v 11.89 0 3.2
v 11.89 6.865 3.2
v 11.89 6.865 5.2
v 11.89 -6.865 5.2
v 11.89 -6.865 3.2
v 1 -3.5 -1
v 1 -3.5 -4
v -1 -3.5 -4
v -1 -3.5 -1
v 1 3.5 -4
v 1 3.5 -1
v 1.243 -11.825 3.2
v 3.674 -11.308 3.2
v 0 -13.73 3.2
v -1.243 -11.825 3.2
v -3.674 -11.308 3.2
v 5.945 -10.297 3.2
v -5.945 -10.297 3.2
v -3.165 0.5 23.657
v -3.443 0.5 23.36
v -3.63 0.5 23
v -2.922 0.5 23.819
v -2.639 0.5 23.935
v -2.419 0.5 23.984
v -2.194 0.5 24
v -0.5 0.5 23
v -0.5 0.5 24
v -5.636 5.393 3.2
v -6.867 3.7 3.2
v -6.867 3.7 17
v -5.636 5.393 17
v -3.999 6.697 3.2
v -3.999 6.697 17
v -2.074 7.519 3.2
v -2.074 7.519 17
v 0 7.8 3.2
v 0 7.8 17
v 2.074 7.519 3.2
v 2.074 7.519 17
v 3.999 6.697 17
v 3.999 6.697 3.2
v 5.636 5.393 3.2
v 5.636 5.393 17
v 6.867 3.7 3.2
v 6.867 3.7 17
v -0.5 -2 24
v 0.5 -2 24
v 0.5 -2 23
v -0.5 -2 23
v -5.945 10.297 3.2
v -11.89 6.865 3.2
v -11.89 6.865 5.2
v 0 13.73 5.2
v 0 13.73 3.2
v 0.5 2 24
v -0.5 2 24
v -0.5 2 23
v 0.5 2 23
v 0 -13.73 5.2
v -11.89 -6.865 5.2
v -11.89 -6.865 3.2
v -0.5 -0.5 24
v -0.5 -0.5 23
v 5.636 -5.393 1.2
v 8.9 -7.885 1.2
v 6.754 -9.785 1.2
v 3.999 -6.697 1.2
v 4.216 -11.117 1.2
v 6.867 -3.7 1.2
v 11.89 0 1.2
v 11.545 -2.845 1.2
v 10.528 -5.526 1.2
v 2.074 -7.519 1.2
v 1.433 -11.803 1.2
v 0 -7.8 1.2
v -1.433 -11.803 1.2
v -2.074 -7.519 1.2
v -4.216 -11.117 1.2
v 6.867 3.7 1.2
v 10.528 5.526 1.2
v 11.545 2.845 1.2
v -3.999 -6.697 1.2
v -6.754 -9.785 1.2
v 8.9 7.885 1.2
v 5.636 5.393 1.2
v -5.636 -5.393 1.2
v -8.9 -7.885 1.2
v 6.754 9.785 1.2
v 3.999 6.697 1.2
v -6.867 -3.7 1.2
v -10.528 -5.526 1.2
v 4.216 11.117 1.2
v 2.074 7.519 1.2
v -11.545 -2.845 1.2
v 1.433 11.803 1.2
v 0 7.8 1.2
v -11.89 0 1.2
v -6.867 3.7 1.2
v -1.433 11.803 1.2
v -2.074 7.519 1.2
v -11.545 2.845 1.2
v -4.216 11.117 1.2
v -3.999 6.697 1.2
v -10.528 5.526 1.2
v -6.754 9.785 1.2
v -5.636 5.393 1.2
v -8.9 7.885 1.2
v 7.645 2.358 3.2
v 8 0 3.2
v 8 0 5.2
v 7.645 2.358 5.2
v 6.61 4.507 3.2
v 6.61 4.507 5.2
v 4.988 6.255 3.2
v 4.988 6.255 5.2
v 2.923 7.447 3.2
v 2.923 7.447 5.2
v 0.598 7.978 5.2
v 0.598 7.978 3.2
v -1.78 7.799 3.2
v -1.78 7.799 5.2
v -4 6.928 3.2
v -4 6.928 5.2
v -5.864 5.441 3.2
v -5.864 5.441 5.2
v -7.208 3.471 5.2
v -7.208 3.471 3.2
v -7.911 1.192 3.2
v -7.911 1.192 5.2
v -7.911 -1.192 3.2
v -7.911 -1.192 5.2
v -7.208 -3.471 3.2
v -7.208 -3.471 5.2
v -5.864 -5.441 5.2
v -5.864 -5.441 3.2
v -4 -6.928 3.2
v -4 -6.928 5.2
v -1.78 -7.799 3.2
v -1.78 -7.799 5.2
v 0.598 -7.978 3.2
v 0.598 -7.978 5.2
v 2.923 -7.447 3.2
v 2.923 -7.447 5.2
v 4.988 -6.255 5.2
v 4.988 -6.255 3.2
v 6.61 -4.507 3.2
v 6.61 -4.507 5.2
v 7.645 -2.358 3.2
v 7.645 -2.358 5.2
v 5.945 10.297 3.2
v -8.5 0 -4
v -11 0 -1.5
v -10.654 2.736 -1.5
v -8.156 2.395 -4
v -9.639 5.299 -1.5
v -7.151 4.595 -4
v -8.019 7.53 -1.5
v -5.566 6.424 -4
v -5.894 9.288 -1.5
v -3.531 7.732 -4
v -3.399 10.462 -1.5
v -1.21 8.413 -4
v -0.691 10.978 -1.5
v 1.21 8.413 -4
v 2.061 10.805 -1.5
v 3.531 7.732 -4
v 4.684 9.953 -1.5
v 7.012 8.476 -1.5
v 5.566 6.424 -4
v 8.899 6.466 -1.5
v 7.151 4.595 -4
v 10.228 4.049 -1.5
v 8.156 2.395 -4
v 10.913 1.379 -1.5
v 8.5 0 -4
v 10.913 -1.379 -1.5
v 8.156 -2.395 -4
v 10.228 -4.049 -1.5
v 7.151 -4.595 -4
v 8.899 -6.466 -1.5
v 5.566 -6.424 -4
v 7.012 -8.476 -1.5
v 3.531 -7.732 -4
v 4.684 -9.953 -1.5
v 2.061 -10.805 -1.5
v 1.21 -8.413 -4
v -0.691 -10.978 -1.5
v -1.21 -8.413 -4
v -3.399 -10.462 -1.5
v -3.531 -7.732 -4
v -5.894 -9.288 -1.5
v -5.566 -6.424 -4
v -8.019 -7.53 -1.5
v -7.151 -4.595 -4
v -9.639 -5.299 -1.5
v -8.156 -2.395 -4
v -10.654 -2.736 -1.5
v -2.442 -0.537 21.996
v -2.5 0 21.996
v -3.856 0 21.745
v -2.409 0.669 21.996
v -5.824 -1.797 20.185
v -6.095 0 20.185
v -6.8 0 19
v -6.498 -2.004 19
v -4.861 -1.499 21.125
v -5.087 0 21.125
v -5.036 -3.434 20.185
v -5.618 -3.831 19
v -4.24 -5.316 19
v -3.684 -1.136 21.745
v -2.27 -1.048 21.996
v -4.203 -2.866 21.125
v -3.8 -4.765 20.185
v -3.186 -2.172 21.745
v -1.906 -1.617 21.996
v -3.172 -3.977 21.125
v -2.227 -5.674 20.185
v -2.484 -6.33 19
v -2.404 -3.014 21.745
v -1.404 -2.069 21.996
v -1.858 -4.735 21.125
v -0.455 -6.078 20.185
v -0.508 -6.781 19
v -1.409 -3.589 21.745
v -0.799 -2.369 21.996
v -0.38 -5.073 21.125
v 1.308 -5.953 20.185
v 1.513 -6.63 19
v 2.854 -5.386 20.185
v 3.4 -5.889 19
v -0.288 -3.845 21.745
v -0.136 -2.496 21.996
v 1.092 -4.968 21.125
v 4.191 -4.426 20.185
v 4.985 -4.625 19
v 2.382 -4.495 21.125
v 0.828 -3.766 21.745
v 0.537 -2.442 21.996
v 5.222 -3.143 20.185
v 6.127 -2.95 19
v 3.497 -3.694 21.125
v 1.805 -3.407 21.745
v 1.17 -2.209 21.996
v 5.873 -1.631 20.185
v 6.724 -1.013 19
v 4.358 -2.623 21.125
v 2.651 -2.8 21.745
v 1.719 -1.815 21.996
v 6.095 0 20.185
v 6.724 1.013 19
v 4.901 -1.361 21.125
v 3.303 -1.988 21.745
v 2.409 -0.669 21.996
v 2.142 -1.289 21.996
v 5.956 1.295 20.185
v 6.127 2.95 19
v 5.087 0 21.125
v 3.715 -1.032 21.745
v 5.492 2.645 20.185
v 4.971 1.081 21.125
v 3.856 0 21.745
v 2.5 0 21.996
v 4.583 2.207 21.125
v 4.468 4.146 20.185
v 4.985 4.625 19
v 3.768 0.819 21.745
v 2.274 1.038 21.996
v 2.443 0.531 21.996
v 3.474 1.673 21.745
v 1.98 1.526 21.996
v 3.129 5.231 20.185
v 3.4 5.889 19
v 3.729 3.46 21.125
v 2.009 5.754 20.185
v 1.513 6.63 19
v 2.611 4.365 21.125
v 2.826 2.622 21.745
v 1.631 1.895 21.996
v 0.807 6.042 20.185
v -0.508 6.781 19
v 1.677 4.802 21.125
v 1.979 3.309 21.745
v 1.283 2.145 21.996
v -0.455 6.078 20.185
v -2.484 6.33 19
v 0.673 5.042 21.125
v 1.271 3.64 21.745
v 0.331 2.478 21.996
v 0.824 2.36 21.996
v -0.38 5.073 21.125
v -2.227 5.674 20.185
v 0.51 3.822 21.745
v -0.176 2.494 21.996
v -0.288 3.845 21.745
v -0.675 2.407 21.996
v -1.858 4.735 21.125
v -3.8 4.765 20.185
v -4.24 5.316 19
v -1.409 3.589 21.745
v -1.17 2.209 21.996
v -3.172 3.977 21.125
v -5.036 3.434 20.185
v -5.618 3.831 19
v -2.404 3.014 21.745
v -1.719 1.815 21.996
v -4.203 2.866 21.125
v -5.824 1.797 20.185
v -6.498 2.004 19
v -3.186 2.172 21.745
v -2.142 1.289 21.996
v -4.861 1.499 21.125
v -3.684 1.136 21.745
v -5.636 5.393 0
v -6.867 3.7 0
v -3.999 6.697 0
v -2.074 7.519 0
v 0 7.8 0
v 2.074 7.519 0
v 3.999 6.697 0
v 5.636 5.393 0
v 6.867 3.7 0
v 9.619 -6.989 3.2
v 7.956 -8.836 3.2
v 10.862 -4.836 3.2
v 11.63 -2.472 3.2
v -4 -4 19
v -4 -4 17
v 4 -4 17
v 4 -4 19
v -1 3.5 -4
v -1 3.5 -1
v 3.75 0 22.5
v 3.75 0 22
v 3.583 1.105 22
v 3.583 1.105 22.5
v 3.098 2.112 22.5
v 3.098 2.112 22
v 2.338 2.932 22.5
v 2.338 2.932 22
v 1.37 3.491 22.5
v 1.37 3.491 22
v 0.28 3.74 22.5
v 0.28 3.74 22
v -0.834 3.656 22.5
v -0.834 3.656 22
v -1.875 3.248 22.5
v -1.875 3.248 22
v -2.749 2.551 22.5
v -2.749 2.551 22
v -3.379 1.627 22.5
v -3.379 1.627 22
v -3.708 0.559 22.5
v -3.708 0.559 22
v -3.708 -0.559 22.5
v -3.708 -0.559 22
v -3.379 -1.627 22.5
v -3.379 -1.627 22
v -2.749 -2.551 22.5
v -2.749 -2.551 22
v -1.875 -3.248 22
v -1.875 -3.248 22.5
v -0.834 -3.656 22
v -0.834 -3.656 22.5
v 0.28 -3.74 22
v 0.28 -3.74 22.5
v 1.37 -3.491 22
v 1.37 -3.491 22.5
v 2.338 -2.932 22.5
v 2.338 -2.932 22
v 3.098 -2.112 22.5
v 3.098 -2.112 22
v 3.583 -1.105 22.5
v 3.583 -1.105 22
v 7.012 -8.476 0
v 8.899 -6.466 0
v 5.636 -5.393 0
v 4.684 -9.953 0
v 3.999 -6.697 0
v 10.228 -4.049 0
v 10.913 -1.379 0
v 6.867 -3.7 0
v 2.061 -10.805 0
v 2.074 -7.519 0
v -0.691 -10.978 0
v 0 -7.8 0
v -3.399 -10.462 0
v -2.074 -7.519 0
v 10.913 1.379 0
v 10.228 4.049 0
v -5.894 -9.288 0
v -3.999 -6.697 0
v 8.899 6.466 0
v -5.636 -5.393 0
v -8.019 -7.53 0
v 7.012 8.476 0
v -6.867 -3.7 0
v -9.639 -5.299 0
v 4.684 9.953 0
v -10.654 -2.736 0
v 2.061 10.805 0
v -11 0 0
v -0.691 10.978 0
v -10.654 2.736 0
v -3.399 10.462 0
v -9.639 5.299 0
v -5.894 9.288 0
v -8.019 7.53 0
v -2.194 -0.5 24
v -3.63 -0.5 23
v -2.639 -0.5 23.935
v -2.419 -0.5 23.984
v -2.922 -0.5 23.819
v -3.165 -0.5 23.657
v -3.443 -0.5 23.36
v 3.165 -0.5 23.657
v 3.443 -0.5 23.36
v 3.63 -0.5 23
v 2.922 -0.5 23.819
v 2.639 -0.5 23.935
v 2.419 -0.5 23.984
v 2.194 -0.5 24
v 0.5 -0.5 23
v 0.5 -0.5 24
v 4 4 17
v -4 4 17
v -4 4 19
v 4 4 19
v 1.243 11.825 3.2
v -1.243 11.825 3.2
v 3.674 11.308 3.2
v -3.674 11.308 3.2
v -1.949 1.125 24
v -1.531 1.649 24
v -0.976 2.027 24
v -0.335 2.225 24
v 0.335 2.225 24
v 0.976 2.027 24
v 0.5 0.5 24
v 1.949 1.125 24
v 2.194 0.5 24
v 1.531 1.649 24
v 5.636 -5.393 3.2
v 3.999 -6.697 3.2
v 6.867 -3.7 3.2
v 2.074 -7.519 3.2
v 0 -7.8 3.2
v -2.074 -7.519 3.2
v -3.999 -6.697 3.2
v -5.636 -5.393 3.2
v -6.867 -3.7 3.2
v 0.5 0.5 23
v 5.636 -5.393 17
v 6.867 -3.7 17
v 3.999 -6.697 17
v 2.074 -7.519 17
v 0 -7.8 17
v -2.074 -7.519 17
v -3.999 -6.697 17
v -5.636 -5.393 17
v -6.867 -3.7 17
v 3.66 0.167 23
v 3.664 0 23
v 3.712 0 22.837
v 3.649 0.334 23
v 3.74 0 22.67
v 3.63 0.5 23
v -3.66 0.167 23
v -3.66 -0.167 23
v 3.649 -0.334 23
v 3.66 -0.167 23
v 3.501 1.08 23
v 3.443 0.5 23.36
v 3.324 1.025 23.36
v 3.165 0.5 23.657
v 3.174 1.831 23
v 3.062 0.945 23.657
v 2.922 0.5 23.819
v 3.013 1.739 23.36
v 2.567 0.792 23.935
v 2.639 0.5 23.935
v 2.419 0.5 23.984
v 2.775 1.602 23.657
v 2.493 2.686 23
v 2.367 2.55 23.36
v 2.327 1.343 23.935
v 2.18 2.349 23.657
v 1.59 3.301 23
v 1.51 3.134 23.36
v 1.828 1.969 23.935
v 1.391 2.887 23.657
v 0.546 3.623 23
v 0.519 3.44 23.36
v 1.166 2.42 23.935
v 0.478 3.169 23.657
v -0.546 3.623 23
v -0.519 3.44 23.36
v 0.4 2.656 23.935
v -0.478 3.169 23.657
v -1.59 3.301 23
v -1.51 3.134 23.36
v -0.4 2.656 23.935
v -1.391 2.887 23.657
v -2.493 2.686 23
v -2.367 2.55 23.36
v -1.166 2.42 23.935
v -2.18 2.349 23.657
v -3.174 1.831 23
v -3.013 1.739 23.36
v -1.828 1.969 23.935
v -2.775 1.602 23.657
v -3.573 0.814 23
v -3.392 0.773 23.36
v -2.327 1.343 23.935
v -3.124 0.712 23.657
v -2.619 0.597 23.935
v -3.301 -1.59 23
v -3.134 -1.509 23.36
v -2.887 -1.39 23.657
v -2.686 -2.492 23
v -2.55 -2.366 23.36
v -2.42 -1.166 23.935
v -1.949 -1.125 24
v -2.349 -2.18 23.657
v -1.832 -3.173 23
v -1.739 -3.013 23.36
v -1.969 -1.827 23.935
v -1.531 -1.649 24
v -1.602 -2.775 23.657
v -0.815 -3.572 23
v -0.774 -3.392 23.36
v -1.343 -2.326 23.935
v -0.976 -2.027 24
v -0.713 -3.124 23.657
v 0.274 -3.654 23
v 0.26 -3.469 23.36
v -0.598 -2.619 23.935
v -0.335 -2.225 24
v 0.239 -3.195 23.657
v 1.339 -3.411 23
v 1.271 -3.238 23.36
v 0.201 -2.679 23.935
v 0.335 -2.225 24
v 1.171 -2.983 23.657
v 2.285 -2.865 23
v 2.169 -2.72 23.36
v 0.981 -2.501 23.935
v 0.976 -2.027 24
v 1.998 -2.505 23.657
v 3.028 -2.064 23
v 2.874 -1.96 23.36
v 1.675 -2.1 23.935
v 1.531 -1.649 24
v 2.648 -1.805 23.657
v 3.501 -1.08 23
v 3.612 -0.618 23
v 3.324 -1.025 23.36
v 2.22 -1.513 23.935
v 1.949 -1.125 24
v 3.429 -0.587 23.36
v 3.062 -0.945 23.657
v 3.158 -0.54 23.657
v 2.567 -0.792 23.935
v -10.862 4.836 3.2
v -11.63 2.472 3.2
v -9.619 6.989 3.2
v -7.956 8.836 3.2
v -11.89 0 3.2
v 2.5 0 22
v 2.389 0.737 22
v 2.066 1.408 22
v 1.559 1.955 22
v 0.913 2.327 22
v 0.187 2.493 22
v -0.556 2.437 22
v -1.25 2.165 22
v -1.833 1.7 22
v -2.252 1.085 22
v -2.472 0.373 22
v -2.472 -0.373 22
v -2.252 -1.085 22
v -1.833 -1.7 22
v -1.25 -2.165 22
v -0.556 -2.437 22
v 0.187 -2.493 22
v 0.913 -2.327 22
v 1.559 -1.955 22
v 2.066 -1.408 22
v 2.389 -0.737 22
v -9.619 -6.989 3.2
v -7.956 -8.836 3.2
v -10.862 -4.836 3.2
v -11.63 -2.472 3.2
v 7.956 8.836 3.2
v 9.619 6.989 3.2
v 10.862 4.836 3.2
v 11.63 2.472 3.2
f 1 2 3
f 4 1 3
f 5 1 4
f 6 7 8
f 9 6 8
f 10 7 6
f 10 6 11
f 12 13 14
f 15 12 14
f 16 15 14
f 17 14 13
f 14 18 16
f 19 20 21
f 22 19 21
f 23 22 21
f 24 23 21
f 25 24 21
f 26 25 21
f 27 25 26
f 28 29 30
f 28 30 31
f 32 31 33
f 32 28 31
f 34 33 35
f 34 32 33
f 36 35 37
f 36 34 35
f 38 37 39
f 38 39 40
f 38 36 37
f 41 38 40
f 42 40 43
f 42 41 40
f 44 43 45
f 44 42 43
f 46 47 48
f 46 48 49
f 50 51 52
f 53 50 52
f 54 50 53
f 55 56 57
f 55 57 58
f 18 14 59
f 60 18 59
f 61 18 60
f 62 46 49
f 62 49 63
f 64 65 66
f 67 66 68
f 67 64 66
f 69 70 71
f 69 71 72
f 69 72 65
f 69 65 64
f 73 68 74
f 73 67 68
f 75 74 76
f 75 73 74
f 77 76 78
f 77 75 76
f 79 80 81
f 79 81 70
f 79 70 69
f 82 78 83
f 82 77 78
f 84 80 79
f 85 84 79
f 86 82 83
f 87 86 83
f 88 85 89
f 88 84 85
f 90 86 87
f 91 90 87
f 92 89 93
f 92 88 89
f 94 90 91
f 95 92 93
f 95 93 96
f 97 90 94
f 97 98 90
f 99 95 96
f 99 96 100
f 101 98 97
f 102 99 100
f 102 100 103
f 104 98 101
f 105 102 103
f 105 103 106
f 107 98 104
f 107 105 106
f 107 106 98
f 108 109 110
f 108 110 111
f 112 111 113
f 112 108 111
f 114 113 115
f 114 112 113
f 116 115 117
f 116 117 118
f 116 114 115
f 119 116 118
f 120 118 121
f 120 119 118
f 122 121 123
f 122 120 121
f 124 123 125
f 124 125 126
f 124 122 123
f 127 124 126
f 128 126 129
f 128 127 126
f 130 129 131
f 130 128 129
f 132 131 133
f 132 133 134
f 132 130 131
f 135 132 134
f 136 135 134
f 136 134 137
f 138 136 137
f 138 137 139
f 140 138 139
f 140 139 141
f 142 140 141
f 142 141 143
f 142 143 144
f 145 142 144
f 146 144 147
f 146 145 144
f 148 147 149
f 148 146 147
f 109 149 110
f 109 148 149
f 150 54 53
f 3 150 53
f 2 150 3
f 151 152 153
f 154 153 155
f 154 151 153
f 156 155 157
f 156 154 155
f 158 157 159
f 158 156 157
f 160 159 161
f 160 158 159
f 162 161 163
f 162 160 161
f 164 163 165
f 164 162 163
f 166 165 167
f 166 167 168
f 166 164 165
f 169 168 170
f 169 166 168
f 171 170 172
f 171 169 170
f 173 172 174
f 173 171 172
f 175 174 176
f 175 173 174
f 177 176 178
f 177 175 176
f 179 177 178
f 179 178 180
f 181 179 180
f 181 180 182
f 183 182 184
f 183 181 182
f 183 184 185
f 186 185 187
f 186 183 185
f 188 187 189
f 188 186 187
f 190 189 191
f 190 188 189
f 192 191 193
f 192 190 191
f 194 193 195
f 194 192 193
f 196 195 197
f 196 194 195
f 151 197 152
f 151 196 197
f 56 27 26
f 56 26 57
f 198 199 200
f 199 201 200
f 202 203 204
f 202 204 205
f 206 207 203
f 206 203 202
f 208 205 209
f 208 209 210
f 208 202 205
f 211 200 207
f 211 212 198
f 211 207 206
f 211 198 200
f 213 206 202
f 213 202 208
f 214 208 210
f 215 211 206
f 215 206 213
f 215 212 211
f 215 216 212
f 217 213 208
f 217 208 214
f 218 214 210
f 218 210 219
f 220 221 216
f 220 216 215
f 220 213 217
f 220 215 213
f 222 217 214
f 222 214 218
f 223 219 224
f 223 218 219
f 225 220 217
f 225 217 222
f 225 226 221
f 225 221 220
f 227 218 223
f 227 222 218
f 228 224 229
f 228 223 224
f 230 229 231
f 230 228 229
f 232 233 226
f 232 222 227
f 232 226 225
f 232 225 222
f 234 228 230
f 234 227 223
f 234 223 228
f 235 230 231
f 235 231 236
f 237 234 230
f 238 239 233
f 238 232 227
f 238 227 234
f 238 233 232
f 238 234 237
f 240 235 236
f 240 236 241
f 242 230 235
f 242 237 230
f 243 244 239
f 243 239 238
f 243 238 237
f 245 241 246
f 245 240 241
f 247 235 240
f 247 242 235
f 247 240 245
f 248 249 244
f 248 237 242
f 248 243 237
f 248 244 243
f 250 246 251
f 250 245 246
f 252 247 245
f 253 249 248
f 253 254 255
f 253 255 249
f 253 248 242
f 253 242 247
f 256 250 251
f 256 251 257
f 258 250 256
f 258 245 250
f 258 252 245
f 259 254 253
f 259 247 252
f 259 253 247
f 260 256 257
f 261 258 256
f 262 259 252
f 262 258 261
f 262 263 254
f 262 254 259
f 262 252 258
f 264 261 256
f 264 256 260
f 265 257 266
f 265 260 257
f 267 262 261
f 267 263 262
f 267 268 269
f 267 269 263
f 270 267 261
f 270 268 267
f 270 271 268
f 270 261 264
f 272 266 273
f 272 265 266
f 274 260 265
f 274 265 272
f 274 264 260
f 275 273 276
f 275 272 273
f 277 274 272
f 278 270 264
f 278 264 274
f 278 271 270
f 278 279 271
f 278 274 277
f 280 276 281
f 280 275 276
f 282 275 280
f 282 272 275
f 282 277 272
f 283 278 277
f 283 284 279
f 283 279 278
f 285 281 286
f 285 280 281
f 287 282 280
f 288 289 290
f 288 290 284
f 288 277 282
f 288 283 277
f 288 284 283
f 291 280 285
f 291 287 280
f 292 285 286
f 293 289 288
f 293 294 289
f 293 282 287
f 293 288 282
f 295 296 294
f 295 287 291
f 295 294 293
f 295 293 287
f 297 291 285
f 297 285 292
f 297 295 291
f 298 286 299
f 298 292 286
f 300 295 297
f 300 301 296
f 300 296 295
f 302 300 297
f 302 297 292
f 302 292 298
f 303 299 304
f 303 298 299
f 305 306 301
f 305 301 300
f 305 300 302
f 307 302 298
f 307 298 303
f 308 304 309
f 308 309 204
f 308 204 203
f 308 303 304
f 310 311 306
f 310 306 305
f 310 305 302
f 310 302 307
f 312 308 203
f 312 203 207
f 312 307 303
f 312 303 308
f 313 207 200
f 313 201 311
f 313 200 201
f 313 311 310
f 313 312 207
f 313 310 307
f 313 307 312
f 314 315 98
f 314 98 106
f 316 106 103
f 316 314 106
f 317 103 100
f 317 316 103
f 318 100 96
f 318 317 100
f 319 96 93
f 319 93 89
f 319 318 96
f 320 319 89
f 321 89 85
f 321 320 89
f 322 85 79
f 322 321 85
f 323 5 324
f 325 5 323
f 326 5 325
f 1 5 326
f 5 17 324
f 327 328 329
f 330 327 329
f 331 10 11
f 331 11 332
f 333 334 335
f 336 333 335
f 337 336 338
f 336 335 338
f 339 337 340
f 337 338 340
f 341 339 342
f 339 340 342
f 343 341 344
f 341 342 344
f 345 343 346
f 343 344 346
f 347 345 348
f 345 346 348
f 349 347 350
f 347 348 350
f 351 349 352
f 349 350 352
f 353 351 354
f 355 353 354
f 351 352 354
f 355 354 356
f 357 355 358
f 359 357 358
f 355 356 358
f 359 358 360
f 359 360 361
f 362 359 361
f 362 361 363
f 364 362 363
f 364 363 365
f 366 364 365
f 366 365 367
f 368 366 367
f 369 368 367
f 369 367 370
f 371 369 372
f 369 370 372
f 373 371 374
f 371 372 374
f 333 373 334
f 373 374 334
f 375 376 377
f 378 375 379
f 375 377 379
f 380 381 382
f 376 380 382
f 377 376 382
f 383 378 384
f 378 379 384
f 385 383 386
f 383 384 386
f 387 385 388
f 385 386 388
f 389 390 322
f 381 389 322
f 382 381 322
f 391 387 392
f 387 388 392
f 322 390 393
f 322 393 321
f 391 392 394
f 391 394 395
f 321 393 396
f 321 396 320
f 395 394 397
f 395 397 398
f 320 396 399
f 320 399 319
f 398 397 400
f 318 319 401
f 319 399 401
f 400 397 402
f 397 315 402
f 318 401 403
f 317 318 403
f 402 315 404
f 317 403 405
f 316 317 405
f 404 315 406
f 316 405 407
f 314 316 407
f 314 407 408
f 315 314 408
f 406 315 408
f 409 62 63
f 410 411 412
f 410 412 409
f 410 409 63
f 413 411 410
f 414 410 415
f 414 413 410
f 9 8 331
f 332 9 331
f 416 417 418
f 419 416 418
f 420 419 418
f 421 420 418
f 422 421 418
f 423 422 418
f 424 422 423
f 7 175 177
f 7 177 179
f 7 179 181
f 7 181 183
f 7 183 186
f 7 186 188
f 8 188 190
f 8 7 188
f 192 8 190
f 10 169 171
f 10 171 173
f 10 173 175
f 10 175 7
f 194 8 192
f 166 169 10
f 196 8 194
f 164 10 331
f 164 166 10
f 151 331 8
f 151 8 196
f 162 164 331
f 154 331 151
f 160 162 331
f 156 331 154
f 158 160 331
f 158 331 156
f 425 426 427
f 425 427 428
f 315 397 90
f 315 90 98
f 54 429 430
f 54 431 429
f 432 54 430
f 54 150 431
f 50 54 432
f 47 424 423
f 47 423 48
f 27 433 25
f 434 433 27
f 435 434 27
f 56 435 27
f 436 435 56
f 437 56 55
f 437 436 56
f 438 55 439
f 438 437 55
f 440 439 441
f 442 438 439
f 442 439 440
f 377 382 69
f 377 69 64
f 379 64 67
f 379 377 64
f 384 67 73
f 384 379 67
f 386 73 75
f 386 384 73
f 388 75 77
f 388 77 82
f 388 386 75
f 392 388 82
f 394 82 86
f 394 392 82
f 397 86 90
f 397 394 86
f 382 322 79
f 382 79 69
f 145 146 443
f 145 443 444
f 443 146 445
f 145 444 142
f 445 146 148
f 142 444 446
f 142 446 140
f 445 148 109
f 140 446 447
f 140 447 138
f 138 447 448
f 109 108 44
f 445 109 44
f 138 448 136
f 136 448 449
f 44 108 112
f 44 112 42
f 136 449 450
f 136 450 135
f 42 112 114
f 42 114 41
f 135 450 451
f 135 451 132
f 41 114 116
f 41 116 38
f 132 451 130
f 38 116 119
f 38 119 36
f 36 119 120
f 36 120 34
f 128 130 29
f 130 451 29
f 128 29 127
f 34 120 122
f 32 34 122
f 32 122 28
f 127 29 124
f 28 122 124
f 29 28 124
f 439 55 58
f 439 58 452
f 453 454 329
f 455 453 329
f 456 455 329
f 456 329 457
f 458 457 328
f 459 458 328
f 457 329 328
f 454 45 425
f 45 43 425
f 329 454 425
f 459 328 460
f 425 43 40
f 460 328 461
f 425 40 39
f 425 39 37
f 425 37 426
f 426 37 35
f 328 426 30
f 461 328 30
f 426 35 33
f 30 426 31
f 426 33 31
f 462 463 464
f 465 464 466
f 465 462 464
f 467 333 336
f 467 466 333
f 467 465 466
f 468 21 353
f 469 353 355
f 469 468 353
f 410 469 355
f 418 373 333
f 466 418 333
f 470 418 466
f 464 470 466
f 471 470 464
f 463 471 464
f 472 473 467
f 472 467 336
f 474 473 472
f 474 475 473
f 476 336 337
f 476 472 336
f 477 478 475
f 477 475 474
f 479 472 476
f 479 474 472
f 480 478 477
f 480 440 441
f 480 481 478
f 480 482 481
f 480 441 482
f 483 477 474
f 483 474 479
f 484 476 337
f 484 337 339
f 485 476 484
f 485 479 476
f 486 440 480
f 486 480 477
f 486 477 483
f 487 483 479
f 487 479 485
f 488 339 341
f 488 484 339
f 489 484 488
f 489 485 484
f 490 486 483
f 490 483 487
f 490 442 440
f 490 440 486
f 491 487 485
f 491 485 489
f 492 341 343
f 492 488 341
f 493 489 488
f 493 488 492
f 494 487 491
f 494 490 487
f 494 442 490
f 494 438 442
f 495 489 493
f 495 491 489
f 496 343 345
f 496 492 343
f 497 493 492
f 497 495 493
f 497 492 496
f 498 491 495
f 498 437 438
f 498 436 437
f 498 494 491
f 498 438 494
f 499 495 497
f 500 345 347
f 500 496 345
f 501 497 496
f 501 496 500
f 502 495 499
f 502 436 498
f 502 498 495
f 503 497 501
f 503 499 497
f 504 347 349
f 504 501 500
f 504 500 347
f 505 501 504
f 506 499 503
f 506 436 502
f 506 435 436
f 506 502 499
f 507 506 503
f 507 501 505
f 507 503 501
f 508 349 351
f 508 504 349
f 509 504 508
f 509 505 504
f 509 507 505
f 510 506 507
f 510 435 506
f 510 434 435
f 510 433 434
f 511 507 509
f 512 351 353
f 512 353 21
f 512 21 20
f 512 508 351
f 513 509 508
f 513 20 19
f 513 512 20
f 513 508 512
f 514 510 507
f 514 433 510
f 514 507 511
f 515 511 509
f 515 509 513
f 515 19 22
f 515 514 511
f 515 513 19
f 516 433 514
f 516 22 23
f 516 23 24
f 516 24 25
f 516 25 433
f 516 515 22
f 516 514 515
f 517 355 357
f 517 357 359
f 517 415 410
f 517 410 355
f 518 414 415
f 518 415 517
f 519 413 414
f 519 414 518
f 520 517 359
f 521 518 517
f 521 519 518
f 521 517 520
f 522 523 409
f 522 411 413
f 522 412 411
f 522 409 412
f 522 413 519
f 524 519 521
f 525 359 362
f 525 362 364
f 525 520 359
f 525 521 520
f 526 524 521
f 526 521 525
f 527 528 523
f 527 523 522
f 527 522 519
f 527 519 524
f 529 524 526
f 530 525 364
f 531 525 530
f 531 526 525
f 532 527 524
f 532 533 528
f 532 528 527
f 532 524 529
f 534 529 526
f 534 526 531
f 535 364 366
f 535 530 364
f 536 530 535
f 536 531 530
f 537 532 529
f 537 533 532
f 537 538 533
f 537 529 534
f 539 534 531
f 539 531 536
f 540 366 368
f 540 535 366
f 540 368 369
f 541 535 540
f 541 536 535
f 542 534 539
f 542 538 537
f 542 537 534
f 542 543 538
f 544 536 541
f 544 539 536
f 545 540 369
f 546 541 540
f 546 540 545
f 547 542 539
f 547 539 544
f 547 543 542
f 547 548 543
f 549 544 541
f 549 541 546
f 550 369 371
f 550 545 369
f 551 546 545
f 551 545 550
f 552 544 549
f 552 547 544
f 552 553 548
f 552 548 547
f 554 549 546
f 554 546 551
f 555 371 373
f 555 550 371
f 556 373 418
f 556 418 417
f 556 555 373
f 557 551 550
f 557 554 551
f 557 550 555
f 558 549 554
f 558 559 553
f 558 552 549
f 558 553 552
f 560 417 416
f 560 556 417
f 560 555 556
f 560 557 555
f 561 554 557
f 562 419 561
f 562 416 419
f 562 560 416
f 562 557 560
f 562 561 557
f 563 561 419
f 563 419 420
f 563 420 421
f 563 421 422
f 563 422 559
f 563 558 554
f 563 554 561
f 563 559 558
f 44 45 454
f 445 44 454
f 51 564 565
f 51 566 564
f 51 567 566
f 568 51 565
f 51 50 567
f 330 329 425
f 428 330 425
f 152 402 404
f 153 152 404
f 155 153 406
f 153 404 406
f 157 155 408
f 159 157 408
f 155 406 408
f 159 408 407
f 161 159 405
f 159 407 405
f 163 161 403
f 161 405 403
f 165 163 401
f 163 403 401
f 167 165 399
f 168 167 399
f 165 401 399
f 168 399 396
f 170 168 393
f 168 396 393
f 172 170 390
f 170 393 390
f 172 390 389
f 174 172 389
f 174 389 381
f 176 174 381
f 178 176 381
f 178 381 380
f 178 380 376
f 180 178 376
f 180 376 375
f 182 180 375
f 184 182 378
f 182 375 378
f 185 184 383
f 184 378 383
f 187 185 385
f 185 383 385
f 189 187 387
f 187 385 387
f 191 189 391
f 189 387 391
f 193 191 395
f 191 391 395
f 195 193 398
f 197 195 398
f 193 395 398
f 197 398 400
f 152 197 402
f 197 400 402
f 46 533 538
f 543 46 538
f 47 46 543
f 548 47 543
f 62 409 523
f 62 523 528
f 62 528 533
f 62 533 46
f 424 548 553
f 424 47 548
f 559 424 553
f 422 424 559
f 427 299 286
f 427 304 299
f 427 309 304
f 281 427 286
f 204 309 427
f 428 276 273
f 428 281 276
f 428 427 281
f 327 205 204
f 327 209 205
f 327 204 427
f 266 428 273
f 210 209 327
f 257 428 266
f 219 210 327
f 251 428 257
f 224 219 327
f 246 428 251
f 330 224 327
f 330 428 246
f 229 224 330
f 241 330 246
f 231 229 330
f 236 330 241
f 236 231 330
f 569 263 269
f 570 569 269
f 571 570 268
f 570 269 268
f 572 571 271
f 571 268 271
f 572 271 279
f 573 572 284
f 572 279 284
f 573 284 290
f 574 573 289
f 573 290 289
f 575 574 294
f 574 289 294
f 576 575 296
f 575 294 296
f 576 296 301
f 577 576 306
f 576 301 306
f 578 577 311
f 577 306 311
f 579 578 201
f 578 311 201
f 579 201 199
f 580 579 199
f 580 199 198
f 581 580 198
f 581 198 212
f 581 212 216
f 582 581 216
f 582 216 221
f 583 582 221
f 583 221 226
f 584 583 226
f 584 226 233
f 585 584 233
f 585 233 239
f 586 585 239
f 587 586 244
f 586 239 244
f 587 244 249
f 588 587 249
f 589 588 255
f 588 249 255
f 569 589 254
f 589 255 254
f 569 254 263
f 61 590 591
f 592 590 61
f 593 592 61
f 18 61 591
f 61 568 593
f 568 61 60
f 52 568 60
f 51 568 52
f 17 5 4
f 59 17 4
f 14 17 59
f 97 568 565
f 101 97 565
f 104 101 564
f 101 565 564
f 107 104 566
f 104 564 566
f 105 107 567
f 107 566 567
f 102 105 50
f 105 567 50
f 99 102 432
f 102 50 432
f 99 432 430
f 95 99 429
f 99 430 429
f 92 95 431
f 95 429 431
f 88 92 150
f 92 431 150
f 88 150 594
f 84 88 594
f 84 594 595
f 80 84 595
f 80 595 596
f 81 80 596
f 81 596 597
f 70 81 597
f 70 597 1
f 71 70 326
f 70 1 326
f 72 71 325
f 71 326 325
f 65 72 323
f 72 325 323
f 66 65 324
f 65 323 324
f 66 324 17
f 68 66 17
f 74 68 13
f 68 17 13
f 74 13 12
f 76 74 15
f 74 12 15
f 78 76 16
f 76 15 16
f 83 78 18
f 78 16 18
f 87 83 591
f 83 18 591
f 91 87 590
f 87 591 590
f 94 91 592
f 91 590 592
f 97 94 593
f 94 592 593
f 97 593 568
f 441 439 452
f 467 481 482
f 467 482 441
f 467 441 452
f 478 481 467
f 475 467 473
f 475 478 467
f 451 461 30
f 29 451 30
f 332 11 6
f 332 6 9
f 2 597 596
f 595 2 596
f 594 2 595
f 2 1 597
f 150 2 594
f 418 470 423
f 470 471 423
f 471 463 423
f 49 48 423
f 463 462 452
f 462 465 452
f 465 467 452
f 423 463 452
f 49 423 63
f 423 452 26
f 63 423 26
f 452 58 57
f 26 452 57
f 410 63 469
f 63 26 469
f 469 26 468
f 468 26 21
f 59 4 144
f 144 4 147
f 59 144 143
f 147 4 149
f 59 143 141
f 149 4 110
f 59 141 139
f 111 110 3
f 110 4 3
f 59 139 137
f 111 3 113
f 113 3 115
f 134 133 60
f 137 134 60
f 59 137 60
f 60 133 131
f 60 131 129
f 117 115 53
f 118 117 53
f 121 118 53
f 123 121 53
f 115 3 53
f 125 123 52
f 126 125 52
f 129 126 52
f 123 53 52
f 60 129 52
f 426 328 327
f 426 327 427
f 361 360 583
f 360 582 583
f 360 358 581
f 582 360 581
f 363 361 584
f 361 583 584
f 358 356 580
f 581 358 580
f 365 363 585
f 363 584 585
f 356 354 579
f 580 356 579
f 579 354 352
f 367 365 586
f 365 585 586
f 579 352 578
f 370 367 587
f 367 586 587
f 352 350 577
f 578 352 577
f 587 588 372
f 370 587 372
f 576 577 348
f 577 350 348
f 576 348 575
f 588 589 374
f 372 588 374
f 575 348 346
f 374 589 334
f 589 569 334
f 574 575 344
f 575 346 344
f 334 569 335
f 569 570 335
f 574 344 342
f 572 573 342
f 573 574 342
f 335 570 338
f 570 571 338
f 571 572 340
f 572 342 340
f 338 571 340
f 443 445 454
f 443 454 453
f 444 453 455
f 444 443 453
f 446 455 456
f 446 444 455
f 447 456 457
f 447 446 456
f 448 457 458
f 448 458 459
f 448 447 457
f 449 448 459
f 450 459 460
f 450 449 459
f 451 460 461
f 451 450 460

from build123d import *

# Parameters (mm, degrees)
EXTRUDE_1_DEPTH     = 17
SKETCH_3_R          = 11
EXTRUDE_2_DEPTH     = 4
CHAMFER_1_SIZE      = 2.5
SKETCH_5_W          = 8
SKETCH_5_H          = 8
EXTRUDE_4_DEPTH     = 2
SKETCH_6_R          = 2.5
EXTRUDE_5_DEPTH     = 3
SKETCH_7_R          = 3.75
EXTRUDE_6_DEPTH     = 2
FILLET_1_R          = 1.5
CUT_EXTRUDE_1_DEPTH = 1
SKETCH_9_R          = 8
EXTRUDE_7_DEPTH     = 2
SKETCH_10_W         = 2
SKETCH_10_H         = 7
CUT_EXTRUDE_2_DEPTH = 3
SKETCH_13_R         = 11.890098709
EXTRUDE_2_2_DEPTH   = 2


with BuildPart() as part:
    # 草图1 → 拉伸1 (new body)
    with BuildSketch(Plane.XY):
        with BuildLine():
            Line((6.86658576, 3.7), (6.86658576, -3.7))
            ThreePointArc((6.86658576, -3.7), (0, -7.8), (-6.86658576, -3.7))
            Line((-6.86658576, -3.7), (-6.86658576, 3.7))
            ThreePointArc((-6.86658576, 3.7), (0, 7.8), (6.86658576, 3.7))
        make_face()
    extrude(amount=EXTRUDE_1_DEPTH)

    # 草图3 → Extrude 2 (add)
    with BuildSketch(Plane(origin=(0, 0, 0), x_dir=(-1, 0, 0), z_dir=(0, 0, -1))):
        Circle(SKETCH_3_R)
    extrude(amount=EXTRUDE_2_DEPTH)

    # 倒角1
    chamfer_1_edges = [part.edges().sort_by_distance(p)[0] for p in [
        (11, 0, -4),
    ]]
    chamfer(chamfer_1_edges, length=CHAMFER_1_SIZE)

    # 草图5 → 拉伸4 (add)
    with BuildSketch(Plane.XY.offset(17)):
        Rectangle(SKETCH_5_W, SKETCH_5_H)
    extrude(amount=EXTRUDE_4_DEPTH)

    # 草图6 → 拉伸5 (add)
    with BuildSketch(Plane.XY.offset(19)):
        Circle(SKETCH_6_R)
    extrude(amount=EXTRUDE_5_DEPTH)

    # 草图7 → 拉伸6 (add)
    with BuildSketch(Plane.XY.offset(22)):
        Circle(SKETCH_7_R)
    extrude(amount=EXTRUDE_6_DEPTH)

    # 圆角1
    fillet_1_edges = [part.edges().sort_by_distance(p)[0] for p in [
        (-3.75, 0, 24),
    ]]
    fillet(fillet_1_edges, radius=FILLET_1_R)

    # 草图8 → 切除-拉伸1 (cut)
    with BuildSketch(Plane.XY.offset(24)):
        Polygon((-4.5, 0.5), (-0.5, 0.5), (-0.5, 2), (0.5, 2), (0.5, 0.5), (4.5, 0.5), (4.5, -0.5), (0.5, -0.5), (0.5, -2), (-0.5, -2), (-0.5, -0.5), (-4.5, -0.5), align=None)
    extrude(amount=-CUT_EXTRUDE_1_DEPTH, mode=Mode.SUBTRACT)

    # 草图10 → 切除-拉伸2 (cut)
    with BuildSketch(Plane(origin=(0, 0, -4), x_dir=(-1, 0, 0), z_dir=(0, 0, -1))):
        Rectangle(SKETCH_10_W, SKETCH_10_H)
    extrude(amount=-CUT_EXTRUDE_2_DEPTH, mode=Mode.SUBTRACT)

    # 草图12 → 旋转2 (revolve)
    with BuildSketch(Plane(origin=(0, 0, 0), x_dir=(0, 0, -1), z_dir=(1, 0, 0)), mode=Mode.PRIVATE) as revolve_2_sk:
        with BuildLine():
            Line((-19, 0), (-19, -6.8))
            ThreePointArc((-19, -6.8), (-21.181245185, -5.004163457), (-22, -2.3))
            Line((-22, -2.3), (-22, 0))
            Line((-22, 0), (-19, 0))
        make_face()
    revolve(revolve_2_sk.sketch.rotate(Axis((0, 0, 0), (0, 0, 1)), 270), axis=Axis((0, 0, 0), (0, 0, 1)))



with BuildPart() as body_2:
    # 草图9 → 拉伸7 (new body)
    with BuildSketch(Plane.XY.offset(3.2)):
        Polygon((11.890098709, -6.86475169), (0, -13.72950338), (-11.890098709, -6.86475169), (-11.890098709, 6.86475169), (0, 13.72950338), (11.890098709, 6.86475169), align=None)
        Circle(SKETCH_9_R, mode=Mode.SUBTRACT)
    extrude(amount=EXTRUDE_7_DEPTH)


with BuildPart() as part_1:
    add(part.part)

    add(body_2.part)  # Extrude 2 2 merges body 2
    # 草图13 → Extrude 2 2 (add)
    with BuildSketch(Plane(origin=(0, 0, 3.2), x_dir=(-1, 0, 0), z_dir=(0, 0, -1))):
        Circle(SKETCH_13_R)
    extrude(amount=EXTRUDE_2_2_DEPTH)


solid = part_1.part
